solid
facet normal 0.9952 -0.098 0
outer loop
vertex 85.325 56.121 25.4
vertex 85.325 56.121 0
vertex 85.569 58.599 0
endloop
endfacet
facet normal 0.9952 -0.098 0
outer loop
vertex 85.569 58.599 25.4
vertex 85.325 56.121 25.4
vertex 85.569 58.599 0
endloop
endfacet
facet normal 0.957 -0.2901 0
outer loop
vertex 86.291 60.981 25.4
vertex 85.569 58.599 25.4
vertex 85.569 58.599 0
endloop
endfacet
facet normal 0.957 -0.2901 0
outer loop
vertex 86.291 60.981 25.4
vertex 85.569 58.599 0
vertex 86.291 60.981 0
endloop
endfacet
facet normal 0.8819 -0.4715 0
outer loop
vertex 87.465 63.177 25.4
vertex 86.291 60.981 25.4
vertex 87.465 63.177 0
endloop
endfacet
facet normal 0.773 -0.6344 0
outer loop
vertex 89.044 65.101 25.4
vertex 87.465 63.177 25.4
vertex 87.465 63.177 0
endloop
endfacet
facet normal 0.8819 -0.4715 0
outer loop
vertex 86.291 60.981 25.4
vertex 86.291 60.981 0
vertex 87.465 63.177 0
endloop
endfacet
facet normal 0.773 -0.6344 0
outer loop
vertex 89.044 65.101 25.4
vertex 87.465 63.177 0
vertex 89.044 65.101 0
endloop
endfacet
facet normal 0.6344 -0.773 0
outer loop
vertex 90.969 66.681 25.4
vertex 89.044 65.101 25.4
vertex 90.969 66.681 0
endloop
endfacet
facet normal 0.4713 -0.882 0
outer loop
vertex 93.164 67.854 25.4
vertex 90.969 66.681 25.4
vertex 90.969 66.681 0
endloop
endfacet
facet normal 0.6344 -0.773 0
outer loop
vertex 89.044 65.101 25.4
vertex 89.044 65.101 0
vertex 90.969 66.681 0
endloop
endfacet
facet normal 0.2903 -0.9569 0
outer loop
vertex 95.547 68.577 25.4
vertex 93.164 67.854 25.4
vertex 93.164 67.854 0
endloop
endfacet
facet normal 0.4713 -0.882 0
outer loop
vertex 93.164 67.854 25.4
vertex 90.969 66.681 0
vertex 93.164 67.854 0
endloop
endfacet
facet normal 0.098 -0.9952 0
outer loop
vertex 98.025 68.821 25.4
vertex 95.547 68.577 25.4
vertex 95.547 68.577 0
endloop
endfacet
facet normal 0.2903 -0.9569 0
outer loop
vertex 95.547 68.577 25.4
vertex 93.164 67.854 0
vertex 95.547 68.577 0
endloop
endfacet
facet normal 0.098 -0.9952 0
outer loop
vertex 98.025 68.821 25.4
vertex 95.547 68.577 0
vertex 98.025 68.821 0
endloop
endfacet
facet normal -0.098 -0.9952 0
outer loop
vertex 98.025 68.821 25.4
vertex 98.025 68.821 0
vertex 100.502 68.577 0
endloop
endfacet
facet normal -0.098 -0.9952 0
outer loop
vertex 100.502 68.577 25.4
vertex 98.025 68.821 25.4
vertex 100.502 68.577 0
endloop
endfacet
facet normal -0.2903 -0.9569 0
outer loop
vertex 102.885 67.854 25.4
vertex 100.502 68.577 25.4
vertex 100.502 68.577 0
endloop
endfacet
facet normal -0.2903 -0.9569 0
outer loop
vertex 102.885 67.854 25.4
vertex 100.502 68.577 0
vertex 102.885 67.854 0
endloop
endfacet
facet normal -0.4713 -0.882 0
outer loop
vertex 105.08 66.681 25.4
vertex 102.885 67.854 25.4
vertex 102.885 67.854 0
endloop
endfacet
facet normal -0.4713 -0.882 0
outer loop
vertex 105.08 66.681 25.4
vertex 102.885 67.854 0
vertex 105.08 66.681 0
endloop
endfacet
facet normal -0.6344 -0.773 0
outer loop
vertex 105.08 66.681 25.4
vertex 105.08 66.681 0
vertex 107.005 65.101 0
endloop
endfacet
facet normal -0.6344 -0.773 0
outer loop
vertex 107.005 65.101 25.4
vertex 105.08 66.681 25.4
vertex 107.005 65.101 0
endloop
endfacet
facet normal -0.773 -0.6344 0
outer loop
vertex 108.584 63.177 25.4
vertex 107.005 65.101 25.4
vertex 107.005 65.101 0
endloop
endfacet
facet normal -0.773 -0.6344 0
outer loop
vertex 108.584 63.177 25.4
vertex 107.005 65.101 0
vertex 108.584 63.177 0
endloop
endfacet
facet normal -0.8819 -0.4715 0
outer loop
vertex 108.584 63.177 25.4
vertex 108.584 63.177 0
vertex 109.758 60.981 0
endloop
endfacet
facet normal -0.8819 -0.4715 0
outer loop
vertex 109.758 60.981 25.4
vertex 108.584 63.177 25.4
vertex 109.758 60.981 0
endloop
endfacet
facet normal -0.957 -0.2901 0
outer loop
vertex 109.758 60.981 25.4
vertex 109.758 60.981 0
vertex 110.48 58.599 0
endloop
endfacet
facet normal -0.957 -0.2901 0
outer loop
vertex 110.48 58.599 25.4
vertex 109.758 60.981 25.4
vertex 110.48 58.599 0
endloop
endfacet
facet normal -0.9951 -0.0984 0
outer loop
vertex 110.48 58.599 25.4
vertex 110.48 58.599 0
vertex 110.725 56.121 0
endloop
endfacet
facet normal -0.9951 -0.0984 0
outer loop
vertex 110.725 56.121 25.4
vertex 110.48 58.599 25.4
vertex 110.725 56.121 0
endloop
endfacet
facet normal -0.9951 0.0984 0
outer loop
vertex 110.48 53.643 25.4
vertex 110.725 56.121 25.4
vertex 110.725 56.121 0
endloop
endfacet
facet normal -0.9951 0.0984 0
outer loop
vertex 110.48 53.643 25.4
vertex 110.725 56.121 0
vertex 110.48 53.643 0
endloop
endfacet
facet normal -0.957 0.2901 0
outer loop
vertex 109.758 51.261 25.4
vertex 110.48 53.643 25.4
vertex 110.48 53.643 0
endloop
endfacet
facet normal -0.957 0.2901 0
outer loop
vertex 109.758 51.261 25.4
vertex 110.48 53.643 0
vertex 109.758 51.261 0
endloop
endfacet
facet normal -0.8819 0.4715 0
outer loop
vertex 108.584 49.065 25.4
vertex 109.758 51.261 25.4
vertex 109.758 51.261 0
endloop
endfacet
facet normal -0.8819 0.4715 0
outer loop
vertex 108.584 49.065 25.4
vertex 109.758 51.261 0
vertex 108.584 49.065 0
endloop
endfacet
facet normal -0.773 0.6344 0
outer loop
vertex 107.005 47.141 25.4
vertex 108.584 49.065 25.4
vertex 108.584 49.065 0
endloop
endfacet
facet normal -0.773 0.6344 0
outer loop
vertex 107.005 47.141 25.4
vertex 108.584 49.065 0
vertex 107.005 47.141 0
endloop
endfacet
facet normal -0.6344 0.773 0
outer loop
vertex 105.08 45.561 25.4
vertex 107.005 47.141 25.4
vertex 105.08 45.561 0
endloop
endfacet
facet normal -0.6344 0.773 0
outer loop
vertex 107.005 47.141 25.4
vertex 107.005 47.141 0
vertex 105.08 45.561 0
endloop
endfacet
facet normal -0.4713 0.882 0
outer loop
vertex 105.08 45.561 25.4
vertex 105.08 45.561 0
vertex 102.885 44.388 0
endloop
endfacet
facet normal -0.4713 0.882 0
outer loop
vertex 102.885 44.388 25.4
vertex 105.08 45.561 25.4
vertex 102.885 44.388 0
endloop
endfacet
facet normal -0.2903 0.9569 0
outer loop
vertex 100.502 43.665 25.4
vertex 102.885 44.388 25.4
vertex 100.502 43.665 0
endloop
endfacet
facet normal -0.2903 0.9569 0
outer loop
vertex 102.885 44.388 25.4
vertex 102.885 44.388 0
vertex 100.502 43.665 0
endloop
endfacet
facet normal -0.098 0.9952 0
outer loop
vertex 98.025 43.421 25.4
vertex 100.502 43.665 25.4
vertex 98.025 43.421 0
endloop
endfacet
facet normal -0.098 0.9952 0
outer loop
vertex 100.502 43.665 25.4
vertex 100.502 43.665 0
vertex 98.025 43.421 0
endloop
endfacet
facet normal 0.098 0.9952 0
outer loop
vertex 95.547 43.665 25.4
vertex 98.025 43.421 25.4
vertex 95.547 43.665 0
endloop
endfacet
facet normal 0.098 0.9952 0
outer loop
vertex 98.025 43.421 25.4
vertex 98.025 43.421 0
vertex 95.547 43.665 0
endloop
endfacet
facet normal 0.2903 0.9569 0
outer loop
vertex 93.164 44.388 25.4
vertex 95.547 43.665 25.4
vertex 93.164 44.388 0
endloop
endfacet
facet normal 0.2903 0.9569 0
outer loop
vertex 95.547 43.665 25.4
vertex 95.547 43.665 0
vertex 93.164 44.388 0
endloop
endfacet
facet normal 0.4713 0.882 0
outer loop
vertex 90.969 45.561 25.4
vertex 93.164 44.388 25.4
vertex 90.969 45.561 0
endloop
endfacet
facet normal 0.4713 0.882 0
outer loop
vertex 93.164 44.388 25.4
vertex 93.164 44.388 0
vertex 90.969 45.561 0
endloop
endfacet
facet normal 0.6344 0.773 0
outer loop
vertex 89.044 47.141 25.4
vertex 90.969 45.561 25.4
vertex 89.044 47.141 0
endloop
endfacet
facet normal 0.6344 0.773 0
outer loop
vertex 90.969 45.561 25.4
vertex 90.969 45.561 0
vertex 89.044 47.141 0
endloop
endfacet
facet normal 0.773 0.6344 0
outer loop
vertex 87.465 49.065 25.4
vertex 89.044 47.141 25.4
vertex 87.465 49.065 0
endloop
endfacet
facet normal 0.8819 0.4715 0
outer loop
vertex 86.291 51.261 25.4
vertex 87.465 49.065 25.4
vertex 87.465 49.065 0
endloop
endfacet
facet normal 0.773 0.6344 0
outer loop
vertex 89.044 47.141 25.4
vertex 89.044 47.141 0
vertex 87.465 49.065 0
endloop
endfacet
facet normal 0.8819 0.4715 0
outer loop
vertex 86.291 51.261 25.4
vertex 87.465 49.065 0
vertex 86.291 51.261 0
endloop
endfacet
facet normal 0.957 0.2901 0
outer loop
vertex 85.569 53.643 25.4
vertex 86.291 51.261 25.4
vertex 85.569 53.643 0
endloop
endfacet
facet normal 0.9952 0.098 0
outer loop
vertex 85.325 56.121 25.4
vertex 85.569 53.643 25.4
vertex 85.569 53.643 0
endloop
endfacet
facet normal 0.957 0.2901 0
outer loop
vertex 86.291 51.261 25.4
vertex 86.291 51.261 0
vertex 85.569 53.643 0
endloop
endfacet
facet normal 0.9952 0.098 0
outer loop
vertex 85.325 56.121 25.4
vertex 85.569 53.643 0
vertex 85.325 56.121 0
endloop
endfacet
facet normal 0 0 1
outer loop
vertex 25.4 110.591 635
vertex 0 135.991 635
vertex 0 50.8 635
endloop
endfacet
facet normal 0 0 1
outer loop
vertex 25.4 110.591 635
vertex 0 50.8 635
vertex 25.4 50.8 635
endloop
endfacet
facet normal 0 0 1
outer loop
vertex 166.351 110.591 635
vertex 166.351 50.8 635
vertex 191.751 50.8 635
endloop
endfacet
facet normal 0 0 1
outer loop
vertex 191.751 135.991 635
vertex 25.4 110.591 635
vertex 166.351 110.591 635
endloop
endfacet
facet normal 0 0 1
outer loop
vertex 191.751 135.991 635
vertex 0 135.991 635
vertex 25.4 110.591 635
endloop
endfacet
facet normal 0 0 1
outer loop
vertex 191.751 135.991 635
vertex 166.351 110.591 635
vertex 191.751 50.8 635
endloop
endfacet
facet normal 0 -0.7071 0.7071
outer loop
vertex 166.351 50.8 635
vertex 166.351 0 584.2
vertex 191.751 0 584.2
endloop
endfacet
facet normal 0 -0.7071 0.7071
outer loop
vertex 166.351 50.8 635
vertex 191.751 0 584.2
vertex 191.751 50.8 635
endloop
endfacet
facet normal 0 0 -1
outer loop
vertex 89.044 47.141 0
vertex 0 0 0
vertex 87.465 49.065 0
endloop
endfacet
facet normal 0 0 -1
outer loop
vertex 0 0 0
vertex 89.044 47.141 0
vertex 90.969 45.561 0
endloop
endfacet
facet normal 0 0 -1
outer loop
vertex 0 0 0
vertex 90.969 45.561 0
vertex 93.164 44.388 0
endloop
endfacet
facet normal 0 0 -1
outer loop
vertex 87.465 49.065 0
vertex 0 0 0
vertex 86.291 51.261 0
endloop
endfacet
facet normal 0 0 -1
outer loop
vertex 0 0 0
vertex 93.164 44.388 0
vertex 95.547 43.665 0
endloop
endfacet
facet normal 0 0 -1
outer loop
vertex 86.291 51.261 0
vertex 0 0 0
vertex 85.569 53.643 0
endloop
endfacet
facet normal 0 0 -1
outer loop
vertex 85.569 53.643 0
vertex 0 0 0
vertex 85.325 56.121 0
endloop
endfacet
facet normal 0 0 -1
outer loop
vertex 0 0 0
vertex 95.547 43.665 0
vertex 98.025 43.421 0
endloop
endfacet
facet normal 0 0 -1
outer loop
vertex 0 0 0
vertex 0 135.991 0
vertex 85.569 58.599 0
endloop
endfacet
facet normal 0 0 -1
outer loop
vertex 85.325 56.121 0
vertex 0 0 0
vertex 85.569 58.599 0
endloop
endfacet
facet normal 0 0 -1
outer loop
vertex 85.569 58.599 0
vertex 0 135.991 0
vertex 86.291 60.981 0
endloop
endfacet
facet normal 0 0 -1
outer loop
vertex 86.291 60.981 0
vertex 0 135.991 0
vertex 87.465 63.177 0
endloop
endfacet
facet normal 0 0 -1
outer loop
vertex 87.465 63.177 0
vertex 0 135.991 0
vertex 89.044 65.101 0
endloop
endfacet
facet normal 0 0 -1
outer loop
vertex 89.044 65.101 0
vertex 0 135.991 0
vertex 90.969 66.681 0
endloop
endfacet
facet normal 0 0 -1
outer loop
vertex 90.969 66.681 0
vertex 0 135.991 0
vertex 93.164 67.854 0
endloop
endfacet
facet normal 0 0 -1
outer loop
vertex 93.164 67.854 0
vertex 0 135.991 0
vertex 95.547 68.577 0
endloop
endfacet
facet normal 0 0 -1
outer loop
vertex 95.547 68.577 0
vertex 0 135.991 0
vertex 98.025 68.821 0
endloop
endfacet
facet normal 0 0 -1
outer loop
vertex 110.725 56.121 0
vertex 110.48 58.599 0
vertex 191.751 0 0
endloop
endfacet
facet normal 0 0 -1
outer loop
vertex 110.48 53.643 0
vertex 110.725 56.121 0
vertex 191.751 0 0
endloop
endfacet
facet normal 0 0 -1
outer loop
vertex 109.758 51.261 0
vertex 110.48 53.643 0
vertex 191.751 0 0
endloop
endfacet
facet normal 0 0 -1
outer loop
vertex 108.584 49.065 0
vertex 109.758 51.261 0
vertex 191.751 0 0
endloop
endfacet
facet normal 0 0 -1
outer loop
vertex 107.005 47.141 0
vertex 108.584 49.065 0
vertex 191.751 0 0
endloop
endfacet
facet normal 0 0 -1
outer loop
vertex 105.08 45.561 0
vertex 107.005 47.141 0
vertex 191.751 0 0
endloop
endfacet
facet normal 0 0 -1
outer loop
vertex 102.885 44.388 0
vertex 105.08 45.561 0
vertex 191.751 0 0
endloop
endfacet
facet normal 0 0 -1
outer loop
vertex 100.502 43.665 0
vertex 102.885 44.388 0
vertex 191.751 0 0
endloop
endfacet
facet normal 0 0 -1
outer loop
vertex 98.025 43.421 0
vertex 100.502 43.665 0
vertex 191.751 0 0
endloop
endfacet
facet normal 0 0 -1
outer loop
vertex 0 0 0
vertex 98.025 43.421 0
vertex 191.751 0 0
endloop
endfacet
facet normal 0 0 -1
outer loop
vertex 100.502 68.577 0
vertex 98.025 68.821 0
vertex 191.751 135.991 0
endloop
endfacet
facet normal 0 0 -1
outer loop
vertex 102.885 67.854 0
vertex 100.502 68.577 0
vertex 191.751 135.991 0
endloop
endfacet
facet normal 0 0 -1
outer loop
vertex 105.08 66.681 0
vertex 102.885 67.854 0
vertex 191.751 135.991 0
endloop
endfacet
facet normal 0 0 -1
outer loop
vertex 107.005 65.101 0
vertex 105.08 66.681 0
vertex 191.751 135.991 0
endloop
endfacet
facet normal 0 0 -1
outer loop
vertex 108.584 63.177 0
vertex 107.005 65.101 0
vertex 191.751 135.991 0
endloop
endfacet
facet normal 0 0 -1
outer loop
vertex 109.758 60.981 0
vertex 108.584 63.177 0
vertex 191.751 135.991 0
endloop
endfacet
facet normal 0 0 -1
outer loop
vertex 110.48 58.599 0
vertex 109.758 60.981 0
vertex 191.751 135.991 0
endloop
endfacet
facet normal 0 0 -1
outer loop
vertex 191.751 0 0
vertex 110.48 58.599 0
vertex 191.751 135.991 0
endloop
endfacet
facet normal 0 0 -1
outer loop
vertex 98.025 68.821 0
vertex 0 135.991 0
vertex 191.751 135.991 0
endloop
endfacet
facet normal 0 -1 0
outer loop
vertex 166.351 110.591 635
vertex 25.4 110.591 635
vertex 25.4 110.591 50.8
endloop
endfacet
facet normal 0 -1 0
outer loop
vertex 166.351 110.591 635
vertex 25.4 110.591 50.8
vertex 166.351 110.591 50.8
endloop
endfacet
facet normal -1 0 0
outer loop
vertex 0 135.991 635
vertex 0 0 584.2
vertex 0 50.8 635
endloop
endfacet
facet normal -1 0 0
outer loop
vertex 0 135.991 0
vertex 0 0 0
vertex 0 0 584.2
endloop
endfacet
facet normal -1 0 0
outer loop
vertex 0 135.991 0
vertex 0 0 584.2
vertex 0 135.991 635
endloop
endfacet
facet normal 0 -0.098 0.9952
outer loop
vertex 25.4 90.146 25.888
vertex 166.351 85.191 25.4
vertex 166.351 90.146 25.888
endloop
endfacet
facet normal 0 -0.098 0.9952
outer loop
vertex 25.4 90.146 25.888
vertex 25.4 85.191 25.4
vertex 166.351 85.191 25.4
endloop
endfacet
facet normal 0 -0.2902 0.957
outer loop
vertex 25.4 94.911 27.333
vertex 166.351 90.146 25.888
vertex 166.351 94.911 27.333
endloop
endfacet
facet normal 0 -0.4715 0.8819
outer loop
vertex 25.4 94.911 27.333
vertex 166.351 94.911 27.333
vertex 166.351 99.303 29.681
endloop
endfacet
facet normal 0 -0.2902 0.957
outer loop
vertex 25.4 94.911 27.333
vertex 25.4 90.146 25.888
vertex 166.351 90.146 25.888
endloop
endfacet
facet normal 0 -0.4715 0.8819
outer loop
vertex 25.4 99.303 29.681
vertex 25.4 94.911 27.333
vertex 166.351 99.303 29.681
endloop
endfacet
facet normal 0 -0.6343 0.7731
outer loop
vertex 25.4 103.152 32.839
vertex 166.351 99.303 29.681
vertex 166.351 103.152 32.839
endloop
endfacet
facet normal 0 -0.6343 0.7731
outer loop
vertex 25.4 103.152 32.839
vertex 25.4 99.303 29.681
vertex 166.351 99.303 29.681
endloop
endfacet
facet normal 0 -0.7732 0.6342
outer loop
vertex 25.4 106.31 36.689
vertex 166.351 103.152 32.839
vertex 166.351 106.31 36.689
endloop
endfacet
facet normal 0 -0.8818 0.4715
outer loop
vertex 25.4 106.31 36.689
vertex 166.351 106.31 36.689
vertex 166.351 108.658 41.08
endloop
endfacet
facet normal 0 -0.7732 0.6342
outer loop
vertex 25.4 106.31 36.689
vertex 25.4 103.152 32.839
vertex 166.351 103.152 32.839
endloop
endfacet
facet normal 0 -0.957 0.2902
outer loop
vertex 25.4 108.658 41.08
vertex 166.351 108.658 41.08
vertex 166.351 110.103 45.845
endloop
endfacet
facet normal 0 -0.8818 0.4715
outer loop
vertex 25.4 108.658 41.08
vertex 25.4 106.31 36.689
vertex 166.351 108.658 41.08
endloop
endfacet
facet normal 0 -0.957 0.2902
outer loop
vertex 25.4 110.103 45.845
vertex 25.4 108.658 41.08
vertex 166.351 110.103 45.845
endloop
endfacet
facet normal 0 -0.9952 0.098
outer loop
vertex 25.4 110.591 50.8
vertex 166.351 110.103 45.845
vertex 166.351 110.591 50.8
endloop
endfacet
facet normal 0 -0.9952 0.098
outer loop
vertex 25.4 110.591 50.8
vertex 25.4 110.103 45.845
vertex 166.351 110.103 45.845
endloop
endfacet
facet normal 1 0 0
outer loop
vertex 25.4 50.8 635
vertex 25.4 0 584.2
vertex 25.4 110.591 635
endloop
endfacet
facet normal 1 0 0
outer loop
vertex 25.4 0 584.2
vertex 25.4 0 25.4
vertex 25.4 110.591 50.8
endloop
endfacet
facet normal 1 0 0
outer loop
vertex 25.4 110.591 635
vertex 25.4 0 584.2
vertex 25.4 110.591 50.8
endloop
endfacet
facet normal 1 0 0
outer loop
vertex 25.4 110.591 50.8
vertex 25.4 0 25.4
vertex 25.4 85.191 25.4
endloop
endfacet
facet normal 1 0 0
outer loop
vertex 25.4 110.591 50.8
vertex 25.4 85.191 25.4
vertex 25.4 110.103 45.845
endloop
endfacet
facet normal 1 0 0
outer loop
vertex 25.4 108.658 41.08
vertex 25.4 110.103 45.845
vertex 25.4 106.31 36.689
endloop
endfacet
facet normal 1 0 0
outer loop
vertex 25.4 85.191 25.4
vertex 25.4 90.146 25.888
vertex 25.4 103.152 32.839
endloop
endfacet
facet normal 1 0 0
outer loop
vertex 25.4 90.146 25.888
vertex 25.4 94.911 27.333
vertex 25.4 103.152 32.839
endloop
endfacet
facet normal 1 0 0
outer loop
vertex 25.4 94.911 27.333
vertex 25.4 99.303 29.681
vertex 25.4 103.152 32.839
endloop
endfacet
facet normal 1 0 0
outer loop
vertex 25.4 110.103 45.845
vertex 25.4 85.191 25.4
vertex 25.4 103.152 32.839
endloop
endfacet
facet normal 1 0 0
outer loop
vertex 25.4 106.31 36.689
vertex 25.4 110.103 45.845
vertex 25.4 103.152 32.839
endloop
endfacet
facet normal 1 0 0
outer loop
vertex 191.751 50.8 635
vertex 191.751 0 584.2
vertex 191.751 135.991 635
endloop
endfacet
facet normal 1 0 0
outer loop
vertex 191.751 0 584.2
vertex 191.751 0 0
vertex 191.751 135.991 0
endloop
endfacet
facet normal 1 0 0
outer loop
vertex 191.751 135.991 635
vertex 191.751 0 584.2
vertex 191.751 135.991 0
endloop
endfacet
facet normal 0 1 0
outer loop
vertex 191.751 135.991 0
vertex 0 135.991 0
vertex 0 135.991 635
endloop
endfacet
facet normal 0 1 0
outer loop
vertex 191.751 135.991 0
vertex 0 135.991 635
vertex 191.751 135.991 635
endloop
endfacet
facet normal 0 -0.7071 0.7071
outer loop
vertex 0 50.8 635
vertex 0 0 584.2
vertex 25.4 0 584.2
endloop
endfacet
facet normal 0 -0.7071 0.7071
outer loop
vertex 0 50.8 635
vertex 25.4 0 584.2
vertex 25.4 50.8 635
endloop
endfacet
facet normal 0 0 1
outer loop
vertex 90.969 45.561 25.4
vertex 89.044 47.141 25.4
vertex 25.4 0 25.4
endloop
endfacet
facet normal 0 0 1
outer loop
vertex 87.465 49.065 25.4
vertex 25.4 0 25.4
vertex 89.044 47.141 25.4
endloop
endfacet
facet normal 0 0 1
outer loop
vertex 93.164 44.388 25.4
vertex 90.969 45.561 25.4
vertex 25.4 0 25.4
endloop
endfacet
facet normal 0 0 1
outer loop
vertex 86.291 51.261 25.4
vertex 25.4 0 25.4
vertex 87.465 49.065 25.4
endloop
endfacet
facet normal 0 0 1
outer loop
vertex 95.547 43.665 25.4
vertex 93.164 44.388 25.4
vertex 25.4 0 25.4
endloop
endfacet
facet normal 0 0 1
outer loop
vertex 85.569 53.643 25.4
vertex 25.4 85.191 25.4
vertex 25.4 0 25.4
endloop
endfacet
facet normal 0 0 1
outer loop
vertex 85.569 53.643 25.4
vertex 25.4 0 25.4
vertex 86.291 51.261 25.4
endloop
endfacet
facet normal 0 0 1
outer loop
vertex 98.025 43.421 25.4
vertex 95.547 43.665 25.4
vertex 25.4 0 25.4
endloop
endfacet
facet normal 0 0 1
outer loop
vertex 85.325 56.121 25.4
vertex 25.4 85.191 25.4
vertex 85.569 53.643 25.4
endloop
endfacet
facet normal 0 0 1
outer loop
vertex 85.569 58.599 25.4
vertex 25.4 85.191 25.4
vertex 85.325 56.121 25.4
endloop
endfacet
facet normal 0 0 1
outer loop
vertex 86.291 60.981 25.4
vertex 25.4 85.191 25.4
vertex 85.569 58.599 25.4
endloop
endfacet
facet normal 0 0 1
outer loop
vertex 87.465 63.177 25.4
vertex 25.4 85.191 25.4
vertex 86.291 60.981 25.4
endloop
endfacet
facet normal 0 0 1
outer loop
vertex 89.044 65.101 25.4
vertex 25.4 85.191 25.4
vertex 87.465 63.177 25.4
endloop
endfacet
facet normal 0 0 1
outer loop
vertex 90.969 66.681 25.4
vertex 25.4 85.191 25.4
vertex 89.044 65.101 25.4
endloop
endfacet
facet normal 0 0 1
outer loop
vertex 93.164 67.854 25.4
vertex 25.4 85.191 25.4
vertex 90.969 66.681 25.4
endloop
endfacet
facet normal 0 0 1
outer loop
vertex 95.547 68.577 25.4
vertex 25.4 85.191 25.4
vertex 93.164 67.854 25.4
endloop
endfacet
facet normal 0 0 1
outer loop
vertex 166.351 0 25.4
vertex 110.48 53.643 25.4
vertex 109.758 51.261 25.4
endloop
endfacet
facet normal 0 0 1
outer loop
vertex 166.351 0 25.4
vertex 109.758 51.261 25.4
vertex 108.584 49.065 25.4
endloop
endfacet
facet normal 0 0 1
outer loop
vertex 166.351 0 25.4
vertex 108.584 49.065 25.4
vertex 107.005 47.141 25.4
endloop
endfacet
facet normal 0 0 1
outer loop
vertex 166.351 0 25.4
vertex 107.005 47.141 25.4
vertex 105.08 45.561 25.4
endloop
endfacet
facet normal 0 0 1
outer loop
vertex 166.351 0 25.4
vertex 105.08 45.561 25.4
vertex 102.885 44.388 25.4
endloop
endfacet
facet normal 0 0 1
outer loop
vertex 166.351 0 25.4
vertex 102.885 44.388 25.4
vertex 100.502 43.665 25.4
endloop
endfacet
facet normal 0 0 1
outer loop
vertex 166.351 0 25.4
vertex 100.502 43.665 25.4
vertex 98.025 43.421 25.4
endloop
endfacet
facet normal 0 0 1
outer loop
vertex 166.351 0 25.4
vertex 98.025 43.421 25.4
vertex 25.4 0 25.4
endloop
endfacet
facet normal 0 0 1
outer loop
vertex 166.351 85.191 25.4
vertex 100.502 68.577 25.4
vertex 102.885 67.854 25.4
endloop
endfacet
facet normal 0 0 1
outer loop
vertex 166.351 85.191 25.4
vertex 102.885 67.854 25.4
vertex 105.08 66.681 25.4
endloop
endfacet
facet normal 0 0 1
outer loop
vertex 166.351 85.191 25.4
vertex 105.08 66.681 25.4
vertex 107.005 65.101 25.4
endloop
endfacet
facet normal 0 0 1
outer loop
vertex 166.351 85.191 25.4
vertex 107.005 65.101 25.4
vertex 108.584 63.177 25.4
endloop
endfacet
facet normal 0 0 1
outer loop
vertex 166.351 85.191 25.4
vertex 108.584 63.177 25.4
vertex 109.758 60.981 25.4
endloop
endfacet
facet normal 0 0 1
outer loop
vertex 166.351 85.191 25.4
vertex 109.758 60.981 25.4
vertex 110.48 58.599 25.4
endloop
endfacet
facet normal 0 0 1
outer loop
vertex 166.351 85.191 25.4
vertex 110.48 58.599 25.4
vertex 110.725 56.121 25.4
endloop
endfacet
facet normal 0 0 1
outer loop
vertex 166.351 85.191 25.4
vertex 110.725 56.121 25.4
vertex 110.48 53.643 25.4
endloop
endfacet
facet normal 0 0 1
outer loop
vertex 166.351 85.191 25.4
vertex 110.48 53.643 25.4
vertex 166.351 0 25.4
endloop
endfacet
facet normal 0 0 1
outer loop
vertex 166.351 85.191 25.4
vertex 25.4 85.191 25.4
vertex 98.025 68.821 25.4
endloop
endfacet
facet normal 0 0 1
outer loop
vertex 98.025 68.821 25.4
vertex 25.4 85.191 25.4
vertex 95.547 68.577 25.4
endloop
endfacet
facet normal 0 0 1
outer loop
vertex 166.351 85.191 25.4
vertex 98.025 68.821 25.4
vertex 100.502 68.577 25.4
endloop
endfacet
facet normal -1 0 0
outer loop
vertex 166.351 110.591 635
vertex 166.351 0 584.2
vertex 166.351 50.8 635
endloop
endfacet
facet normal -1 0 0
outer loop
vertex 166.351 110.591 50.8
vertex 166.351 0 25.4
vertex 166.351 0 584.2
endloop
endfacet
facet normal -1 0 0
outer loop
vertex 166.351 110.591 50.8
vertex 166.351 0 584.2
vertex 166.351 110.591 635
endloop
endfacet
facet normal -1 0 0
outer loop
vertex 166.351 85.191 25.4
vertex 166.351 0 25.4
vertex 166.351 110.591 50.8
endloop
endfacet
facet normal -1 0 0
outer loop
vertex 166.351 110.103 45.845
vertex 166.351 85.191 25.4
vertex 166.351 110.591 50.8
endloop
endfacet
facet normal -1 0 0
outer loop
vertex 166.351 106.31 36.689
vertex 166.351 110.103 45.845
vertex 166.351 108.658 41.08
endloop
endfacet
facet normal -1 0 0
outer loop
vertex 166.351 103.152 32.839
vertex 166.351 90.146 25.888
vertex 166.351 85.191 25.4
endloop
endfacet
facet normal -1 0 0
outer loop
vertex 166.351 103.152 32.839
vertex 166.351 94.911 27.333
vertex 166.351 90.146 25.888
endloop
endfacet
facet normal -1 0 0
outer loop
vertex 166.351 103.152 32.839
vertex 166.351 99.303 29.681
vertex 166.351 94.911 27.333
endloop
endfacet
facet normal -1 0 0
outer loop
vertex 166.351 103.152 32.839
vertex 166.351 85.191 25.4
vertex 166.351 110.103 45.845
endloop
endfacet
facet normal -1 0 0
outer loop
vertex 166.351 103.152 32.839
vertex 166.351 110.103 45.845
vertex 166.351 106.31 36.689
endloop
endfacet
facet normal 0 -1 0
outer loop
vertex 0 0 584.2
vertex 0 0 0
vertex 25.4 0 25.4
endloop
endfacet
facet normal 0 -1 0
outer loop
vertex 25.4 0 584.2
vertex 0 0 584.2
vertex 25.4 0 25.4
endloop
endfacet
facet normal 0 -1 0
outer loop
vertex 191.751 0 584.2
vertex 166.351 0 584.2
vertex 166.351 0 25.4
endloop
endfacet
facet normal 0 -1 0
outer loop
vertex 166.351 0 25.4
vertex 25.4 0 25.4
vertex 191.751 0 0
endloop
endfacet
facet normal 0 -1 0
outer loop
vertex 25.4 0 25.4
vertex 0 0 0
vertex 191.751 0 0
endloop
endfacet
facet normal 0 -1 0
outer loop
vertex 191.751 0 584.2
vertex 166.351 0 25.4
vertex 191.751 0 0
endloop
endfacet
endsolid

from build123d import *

# Parameters (mm, degrees)
F0_W        = 191.7510181665
F0_H        = 135.9910964966
F1_DEPTH    = 635
F2_T        = -25.4
F4_D        = 25.4
F5_R        = 25.4
F6_T1_DEPTH = 286.6829915773
F6_T3_DEPTH = 286.6829915773


# Not quite as in the source:
# - a fillet or chamfer that OpenCascade refuses, or shapes differently, is made with other operations: its cross-section is extruded or revolved along the edge and cut away or added


with BuildPart() as f1:
    # F0 (on Top) → F1 (new body)
    with BuildSketch(Plane.XY):
        with Locations((95.8755090833, 67.9955482483)):
            Rectangle(F0_W, F0_H)
    extrude(amount=F1_DEPTH)

    # F2
    f2_openings = [f1.faces().sort_by_distance(p)[0] for p in [
        (95.875509, 0, 317.5),
        (95.875509, 67.995548, 635),
    ]]
    offset(amount=F2_T, openings=f2_openings)

    # F4 (through all)
    with Locations(Plane.XY.offset(25.4)):
        with Locations((98.0245098472, 56.1208538711)):
            Hole(F4_D / 2)

    # F5
    f5_edges = [f1.edges().sort_by_distance(p)[0] for p in [
        (95.875509, 110.591096, 25.4),
    ]]
    fillet(f5_edges, radius=F5_R)

    # F6: chamfer of 50.8 on 3 edges, made by hand

    # F6_s2 → F6_t1 (cut)
    with BuildSketch(Plane.YZ.offset(-130.6414957887)):
        Polygon((0, 584.2), (50.8, 635), (0, 635), align=None)
    extrude(amount=F6_T1_DEPTH, mode=Mode.SUBTRACT)

    # F6_s4 → F6_t3 (cut)
    with BuildSketch(Plane.YZ.offset(35.7095223779)):
        Polygon((0, 584.2), (50.8, 635), (0, 635), align=None)
    extrude(amount=F6_T3_DEPTH, mode=Mode.SUBTRACT)


solid = f1.part
